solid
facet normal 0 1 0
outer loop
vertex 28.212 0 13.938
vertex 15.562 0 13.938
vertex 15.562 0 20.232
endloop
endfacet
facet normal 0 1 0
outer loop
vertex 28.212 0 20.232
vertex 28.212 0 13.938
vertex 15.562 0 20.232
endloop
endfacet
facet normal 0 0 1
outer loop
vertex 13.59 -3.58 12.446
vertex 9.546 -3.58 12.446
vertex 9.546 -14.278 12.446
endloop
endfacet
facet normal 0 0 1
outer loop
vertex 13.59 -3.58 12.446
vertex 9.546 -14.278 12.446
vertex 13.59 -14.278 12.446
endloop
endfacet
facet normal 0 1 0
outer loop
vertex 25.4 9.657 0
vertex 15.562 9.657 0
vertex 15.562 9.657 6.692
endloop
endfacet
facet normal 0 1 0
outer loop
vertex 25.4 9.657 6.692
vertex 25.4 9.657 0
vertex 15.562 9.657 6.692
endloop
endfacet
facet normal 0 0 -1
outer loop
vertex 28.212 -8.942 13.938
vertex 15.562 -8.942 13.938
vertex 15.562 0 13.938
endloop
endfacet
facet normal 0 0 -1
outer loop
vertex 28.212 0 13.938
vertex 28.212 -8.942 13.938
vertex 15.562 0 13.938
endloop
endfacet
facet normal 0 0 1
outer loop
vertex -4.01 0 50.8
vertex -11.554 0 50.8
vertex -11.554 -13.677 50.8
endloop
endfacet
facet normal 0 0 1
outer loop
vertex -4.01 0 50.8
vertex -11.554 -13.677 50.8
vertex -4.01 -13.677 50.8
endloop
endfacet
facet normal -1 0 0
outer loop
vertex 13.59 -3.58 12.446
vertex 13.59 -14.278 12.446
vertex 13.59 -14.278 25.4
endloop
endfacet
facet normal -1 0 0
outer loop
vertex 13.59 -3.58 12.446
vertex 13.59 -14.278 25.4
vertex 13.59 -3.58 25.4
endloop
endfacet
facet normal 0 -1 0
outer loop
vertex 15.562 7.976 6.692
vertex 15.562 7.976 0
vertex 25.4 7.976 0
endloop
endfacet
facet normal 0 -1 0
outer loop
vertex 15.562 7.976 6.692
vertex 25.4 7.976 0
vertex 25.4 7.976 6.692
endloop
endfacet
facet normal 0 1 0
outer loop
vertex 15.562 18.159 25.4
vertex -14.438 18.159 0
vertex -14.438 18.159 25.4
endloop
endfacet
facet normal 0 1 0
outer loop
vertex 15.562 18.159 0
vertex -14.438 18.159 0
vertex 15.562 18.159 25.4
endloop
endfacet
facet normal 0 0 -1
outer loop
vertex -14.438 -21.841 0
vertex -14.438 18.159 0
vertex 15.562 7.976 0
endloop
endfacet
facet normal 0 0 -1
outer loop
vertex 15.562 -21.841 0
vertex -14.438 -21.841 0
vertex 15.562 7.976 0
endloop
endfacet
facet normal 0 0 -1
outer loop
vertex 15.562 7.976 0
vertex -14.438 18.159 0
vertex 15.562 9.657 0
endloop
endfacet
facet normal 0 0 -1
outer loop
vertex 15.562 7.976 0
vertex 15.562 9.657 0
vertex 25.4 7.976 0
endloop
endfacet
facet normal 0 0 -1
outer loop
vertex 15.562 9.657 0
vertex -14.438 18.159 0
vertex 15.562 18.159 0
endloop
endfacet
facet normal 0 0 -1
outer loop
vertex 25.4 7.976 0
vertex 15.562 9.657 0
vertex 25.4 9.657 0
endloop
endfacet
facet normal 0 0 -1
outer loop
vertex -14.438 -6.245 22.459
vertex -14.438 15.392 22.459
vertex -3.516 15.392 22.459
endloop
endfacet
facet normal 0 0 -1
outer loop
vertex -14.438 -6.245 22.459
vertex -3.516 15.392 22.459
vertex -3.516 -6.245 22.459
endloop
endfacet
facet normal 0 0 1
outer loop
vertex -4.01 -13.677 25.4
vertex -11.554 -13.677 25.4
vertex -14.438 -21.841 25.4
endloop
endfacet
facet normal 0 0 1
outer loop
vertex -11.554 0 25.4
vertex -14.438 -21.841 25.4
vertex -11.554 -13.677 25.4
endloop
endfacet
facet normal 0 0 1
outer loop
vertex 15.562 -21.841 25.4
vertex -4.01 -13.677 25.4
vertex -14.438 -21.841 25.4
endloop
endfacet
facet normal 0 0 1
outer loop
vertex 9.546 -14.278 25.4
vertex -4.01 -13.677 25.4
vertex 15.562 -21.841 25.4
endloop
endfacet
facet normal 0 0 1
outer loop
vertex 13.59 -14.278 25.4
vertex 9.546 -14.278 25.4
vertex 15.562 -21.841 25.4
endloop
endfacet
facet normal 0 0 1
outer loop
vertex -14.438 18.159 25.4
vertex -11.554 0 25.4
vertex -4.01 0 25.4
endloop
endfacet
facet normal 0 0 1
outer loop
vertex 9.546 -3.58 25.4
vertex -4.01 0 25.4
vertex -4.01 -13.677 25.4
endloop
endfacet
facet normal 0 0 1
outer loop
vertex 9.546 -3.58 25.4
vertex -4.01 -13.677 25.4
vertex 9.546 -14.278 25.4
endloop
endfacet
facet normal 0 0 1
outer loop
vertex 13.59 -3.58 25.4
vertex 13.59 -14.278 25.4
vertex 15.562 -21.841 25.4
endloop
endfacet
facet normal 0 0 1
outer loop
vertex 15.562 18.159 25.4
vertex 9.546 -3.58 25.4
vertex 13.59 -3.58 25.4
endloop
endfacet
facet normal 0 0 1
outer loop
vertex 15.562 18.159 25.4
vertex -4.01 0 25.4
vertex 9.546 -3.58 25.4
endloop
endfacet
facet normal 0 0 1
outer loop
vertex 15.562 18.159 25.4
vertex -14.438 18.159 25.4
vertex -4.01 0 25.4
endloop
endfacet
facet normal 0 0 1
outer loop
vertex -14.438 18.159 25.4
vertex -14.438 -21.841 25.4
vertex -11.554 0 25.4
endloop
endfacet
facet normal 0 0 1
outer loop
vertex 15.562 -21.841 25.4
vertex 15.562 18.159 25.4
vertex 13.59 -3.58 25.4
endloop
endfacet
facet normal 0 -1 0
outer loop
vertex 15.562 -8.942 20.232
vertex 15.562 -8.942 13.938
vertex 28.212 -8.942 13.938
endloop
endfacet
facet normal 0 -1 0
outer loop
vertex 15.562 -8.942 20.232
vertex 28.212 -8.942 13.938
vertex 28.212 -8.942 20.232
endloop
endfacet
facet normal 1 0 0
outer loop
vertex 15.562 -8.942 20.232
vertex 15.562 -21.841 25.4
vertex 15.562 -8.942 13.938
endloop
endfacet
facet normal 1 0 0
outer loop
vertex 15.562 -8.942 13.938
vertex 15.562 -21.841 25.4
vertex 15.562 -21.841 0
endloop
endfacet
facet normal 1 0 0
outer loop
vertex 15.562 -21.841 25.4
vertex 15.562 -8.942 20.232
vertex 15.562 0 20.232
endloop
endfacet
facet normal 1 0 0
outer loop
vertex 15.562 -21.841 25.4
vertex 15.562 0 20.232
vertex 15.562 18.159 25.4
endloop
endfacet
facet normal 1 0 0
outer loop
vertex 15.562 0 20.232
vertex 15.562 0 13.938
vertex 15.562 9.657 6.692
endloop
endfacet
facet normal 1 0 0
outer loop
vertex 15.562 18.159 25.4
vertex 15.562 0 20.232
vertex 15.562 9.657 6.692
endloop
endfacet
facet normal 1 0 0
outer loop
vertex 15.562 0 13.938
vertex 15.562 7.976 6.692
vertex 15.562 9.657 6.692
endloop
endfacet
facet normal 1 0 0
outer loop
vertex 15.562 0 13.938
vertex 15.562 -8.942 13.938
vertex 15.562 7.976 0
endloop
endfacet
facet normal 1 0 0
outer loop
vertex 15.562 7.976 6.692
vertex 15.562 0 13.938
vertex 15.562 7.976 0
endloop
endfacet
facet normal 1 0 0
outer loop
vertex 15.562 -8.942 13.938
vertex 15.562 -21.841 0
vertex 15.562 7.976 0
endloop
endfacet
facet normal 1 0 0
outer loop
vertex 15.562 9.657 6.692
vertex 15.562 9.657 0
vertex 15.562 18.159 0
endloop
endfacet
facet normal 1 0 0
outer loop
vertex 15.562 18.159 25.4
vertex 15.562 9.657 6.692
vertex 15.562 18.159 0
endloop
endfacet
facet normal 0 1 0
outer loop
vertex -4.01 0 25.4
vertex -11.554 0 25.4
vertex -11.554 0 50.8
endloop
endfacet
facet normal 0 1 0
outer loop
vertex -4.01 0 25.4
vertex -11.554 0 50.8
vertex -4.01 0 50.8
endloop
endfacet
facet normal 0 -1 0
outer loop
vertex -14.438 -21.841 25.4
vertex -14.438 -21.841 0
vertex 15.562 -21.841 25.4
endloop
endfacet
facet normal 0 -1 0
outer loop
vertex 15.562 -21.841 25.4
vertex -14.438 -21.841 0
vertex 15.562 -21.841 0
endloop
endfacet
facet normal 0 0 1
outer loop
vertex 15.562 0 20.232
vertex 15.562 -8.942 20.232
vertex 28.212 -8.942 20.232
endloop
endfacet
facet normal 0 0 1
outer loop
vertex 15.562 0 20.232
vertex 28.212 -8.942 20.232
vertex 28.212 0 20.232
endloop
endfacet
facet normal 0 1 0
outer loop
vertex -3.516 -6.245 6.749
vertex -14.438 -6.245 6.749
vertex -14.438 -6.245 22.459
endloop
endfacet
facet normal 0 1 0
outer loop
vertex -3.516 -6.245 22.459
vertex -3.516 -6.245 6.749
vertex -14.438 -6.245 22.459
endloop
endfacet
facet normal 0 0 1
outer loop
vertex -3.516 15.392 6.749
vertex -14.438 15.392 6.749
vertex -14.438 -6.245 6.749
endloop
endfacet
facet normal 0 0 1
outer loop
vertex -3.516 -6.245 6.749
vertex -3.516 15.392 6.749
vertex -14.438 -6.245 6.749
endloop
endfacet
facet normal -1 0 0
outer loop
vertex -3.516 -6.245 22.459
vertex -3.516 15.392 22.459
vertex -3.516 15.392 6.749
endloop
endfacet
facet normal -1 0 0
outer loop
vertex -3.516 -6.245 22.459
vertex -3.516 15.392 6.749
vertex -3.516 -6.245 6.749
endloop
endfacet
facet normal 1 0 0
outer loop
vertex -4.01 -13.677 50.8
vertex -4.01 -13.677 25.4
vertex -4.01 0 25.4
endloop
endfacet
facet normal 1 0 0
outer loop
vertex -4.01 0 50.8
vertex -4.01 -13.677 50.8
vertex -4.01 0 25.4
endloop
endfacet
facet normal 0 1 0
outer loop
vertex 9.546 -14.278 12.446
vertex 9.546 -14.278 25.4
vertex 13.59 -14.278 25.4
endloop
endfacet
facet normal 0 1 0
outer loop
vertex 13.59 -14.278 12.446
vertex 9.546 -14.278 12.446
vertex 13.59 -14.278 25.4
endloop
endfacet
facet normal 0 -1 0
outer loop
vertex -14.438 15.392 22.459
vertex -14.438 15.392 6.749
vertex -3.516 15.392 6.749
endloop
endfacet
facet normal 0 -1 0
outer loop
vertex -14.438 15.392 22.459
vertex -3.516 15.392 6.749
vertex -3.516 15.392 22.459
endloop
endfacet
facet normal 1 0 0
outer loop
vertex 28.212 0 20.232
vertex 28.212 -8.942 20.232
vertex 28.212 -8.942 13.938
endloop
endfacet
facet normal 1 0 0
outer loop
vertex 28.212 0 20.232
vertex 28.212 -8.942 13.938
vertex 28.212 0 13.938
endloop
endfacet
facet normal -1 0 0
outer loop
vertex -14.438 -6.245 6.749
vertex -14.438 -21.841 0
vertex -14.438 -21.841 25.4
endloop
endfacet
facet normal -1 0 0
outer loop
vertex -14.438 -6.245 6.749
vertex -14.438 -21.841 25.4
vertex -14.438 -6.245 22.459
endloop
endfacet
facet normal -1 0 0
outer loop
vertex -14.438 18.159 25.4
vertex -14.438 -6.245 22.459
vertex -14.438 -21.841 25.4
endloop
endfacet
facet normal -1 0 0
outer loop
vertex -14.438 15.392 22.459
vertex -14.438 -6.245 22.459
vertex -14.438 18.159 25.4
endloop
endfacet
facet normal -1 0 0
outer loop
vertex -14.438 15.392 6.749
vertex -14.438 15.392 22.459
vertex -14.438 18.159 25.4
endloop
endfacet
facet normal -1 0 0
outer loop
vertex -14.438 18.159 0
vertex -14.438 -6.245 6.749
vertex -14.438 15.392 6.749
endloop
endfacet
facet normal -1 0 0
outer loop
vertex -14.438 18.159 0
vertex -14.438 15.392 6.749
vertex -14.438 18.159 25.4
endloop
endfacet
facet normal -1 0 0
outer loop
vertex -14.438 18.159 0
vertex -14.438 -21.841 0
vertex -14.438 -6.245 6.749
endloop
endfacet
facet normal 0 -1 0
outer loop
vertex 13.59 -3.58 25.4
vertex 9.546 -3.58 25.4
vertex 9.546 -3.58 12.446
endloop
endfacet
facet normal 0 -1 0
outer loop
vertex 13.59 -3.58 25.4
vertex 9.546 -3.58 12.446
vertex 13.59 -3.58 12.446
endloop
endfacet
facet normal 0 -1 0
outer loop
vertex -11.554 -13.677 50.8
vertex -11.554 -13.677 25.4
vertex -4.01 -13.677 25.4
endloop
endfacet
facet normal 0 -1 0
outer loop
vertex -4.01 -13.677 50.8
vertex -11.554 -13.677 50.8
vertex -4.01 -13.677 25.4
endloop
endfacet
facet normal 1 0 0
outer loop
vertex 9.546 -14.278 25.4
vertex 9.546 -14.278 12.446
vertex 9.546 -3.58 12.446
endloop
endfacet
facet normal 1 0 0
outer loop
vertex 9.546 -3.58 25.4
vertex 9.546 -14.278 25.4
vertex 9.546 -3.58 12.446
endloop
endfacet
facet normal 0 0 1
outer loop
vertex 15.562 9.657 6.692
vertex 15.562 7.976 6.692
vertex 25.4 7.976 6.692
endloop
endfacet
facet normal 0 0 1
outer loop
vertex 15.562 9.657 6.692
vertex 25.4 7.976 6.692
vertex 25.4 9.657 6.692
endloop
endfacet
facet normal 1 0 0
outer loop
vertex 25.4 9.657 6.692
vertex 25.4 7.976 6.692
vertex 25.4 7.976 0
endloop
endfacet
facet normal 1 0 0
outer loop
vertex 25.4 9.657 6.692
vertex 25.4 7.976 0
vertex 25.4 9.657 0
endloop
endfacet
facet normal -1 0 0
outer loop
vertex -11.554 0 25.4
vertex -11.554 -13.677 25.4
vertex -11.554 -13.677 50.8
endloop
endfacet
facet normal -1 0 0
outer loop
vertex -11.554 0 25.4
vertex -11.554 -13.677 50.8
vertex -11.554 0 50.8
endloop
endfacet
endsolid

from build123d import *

# Parameters (mm, degrees)
F0_W      = 30
F0_H      = 40
F1_DEPTH  = 25.4
F3_W      = 7.5436746702
F3_H      = 13.6774647981
F4_DEPTH  = 25.4
F5_W      = 4.043773748
F5_H      = 10.6986747123
F6_DEPTH  = 12.954
F7_W      = 1.6801413149
F7_H      = 6.6922605038
F8_DEPTH  = 25.4
F9_W      = 21.6371780261
F9_H      = 15.7099463977
F10_DEPTH = 10.922
F11_W     = 8.9419111609
F11_H     = 6.2935836613
F12_DEPTH = 12.6496255398


with BuildPart() as f1:
    # F0 (on Top) → F1 (new body)
    with BuildSketch(Plane.XY):
        with Locations((0.5621314049, -1.8406331738)):
            Rectangle(F0_W, F0_H)
    extrude(amount=F1_DEPTH)

    # F3 (on face) → F4 (join)
    with BuildSketch(Plane.XY.offset(25.4)):
        with Locations((-7.7819279395, -6.838732399)):
            Rectangle(F3_W, F3_H)
    extrude(amount=F4_DEPTH)

    # F5 (on face) → F6 (cut)
    with BuildSketch(Plane.XY.offset(25.4)):
        with Locations((11.5681807511, -8.9288947638)):
            Rectangle(F5_W, F5_H)
    extrude(amount=-F6_DEPTH, mode=Mode.SUBTRACT)

    # F7 (on Right) → F8 (join)
    with BuildSketch(Plane.YZ):
        with Locations((8.8164666668, 3.3461302519)):
            Rectangle(F7_W, F7_H)
    extrude(amount=F8_DEPTH)

    # F9 (on face) → F10 (cut)
    with BuildSketch(Plane(origin=(-14.4378685951, 0, 0), x_dir=(0, -1, 0), z_dir=(-1, 0, 0))):
        with Locations((-4.5737433247, 14.6038669627)):
            Rectangle(F9_W, F9_H)
    extrude(amount=-F10_DEPTH, mode=Mode.SUBTRACT)

    # F11 (on face) → F12 (join)
    with BuildSketch(Plane.YZ.offset(15.5621314049)):
        with Locations((-4.4709555805, 17.0851889998)):
            Rectangle(F11_W, F11_H)
    extrude(amount=F12_DEPTH)


solid = f1.part
